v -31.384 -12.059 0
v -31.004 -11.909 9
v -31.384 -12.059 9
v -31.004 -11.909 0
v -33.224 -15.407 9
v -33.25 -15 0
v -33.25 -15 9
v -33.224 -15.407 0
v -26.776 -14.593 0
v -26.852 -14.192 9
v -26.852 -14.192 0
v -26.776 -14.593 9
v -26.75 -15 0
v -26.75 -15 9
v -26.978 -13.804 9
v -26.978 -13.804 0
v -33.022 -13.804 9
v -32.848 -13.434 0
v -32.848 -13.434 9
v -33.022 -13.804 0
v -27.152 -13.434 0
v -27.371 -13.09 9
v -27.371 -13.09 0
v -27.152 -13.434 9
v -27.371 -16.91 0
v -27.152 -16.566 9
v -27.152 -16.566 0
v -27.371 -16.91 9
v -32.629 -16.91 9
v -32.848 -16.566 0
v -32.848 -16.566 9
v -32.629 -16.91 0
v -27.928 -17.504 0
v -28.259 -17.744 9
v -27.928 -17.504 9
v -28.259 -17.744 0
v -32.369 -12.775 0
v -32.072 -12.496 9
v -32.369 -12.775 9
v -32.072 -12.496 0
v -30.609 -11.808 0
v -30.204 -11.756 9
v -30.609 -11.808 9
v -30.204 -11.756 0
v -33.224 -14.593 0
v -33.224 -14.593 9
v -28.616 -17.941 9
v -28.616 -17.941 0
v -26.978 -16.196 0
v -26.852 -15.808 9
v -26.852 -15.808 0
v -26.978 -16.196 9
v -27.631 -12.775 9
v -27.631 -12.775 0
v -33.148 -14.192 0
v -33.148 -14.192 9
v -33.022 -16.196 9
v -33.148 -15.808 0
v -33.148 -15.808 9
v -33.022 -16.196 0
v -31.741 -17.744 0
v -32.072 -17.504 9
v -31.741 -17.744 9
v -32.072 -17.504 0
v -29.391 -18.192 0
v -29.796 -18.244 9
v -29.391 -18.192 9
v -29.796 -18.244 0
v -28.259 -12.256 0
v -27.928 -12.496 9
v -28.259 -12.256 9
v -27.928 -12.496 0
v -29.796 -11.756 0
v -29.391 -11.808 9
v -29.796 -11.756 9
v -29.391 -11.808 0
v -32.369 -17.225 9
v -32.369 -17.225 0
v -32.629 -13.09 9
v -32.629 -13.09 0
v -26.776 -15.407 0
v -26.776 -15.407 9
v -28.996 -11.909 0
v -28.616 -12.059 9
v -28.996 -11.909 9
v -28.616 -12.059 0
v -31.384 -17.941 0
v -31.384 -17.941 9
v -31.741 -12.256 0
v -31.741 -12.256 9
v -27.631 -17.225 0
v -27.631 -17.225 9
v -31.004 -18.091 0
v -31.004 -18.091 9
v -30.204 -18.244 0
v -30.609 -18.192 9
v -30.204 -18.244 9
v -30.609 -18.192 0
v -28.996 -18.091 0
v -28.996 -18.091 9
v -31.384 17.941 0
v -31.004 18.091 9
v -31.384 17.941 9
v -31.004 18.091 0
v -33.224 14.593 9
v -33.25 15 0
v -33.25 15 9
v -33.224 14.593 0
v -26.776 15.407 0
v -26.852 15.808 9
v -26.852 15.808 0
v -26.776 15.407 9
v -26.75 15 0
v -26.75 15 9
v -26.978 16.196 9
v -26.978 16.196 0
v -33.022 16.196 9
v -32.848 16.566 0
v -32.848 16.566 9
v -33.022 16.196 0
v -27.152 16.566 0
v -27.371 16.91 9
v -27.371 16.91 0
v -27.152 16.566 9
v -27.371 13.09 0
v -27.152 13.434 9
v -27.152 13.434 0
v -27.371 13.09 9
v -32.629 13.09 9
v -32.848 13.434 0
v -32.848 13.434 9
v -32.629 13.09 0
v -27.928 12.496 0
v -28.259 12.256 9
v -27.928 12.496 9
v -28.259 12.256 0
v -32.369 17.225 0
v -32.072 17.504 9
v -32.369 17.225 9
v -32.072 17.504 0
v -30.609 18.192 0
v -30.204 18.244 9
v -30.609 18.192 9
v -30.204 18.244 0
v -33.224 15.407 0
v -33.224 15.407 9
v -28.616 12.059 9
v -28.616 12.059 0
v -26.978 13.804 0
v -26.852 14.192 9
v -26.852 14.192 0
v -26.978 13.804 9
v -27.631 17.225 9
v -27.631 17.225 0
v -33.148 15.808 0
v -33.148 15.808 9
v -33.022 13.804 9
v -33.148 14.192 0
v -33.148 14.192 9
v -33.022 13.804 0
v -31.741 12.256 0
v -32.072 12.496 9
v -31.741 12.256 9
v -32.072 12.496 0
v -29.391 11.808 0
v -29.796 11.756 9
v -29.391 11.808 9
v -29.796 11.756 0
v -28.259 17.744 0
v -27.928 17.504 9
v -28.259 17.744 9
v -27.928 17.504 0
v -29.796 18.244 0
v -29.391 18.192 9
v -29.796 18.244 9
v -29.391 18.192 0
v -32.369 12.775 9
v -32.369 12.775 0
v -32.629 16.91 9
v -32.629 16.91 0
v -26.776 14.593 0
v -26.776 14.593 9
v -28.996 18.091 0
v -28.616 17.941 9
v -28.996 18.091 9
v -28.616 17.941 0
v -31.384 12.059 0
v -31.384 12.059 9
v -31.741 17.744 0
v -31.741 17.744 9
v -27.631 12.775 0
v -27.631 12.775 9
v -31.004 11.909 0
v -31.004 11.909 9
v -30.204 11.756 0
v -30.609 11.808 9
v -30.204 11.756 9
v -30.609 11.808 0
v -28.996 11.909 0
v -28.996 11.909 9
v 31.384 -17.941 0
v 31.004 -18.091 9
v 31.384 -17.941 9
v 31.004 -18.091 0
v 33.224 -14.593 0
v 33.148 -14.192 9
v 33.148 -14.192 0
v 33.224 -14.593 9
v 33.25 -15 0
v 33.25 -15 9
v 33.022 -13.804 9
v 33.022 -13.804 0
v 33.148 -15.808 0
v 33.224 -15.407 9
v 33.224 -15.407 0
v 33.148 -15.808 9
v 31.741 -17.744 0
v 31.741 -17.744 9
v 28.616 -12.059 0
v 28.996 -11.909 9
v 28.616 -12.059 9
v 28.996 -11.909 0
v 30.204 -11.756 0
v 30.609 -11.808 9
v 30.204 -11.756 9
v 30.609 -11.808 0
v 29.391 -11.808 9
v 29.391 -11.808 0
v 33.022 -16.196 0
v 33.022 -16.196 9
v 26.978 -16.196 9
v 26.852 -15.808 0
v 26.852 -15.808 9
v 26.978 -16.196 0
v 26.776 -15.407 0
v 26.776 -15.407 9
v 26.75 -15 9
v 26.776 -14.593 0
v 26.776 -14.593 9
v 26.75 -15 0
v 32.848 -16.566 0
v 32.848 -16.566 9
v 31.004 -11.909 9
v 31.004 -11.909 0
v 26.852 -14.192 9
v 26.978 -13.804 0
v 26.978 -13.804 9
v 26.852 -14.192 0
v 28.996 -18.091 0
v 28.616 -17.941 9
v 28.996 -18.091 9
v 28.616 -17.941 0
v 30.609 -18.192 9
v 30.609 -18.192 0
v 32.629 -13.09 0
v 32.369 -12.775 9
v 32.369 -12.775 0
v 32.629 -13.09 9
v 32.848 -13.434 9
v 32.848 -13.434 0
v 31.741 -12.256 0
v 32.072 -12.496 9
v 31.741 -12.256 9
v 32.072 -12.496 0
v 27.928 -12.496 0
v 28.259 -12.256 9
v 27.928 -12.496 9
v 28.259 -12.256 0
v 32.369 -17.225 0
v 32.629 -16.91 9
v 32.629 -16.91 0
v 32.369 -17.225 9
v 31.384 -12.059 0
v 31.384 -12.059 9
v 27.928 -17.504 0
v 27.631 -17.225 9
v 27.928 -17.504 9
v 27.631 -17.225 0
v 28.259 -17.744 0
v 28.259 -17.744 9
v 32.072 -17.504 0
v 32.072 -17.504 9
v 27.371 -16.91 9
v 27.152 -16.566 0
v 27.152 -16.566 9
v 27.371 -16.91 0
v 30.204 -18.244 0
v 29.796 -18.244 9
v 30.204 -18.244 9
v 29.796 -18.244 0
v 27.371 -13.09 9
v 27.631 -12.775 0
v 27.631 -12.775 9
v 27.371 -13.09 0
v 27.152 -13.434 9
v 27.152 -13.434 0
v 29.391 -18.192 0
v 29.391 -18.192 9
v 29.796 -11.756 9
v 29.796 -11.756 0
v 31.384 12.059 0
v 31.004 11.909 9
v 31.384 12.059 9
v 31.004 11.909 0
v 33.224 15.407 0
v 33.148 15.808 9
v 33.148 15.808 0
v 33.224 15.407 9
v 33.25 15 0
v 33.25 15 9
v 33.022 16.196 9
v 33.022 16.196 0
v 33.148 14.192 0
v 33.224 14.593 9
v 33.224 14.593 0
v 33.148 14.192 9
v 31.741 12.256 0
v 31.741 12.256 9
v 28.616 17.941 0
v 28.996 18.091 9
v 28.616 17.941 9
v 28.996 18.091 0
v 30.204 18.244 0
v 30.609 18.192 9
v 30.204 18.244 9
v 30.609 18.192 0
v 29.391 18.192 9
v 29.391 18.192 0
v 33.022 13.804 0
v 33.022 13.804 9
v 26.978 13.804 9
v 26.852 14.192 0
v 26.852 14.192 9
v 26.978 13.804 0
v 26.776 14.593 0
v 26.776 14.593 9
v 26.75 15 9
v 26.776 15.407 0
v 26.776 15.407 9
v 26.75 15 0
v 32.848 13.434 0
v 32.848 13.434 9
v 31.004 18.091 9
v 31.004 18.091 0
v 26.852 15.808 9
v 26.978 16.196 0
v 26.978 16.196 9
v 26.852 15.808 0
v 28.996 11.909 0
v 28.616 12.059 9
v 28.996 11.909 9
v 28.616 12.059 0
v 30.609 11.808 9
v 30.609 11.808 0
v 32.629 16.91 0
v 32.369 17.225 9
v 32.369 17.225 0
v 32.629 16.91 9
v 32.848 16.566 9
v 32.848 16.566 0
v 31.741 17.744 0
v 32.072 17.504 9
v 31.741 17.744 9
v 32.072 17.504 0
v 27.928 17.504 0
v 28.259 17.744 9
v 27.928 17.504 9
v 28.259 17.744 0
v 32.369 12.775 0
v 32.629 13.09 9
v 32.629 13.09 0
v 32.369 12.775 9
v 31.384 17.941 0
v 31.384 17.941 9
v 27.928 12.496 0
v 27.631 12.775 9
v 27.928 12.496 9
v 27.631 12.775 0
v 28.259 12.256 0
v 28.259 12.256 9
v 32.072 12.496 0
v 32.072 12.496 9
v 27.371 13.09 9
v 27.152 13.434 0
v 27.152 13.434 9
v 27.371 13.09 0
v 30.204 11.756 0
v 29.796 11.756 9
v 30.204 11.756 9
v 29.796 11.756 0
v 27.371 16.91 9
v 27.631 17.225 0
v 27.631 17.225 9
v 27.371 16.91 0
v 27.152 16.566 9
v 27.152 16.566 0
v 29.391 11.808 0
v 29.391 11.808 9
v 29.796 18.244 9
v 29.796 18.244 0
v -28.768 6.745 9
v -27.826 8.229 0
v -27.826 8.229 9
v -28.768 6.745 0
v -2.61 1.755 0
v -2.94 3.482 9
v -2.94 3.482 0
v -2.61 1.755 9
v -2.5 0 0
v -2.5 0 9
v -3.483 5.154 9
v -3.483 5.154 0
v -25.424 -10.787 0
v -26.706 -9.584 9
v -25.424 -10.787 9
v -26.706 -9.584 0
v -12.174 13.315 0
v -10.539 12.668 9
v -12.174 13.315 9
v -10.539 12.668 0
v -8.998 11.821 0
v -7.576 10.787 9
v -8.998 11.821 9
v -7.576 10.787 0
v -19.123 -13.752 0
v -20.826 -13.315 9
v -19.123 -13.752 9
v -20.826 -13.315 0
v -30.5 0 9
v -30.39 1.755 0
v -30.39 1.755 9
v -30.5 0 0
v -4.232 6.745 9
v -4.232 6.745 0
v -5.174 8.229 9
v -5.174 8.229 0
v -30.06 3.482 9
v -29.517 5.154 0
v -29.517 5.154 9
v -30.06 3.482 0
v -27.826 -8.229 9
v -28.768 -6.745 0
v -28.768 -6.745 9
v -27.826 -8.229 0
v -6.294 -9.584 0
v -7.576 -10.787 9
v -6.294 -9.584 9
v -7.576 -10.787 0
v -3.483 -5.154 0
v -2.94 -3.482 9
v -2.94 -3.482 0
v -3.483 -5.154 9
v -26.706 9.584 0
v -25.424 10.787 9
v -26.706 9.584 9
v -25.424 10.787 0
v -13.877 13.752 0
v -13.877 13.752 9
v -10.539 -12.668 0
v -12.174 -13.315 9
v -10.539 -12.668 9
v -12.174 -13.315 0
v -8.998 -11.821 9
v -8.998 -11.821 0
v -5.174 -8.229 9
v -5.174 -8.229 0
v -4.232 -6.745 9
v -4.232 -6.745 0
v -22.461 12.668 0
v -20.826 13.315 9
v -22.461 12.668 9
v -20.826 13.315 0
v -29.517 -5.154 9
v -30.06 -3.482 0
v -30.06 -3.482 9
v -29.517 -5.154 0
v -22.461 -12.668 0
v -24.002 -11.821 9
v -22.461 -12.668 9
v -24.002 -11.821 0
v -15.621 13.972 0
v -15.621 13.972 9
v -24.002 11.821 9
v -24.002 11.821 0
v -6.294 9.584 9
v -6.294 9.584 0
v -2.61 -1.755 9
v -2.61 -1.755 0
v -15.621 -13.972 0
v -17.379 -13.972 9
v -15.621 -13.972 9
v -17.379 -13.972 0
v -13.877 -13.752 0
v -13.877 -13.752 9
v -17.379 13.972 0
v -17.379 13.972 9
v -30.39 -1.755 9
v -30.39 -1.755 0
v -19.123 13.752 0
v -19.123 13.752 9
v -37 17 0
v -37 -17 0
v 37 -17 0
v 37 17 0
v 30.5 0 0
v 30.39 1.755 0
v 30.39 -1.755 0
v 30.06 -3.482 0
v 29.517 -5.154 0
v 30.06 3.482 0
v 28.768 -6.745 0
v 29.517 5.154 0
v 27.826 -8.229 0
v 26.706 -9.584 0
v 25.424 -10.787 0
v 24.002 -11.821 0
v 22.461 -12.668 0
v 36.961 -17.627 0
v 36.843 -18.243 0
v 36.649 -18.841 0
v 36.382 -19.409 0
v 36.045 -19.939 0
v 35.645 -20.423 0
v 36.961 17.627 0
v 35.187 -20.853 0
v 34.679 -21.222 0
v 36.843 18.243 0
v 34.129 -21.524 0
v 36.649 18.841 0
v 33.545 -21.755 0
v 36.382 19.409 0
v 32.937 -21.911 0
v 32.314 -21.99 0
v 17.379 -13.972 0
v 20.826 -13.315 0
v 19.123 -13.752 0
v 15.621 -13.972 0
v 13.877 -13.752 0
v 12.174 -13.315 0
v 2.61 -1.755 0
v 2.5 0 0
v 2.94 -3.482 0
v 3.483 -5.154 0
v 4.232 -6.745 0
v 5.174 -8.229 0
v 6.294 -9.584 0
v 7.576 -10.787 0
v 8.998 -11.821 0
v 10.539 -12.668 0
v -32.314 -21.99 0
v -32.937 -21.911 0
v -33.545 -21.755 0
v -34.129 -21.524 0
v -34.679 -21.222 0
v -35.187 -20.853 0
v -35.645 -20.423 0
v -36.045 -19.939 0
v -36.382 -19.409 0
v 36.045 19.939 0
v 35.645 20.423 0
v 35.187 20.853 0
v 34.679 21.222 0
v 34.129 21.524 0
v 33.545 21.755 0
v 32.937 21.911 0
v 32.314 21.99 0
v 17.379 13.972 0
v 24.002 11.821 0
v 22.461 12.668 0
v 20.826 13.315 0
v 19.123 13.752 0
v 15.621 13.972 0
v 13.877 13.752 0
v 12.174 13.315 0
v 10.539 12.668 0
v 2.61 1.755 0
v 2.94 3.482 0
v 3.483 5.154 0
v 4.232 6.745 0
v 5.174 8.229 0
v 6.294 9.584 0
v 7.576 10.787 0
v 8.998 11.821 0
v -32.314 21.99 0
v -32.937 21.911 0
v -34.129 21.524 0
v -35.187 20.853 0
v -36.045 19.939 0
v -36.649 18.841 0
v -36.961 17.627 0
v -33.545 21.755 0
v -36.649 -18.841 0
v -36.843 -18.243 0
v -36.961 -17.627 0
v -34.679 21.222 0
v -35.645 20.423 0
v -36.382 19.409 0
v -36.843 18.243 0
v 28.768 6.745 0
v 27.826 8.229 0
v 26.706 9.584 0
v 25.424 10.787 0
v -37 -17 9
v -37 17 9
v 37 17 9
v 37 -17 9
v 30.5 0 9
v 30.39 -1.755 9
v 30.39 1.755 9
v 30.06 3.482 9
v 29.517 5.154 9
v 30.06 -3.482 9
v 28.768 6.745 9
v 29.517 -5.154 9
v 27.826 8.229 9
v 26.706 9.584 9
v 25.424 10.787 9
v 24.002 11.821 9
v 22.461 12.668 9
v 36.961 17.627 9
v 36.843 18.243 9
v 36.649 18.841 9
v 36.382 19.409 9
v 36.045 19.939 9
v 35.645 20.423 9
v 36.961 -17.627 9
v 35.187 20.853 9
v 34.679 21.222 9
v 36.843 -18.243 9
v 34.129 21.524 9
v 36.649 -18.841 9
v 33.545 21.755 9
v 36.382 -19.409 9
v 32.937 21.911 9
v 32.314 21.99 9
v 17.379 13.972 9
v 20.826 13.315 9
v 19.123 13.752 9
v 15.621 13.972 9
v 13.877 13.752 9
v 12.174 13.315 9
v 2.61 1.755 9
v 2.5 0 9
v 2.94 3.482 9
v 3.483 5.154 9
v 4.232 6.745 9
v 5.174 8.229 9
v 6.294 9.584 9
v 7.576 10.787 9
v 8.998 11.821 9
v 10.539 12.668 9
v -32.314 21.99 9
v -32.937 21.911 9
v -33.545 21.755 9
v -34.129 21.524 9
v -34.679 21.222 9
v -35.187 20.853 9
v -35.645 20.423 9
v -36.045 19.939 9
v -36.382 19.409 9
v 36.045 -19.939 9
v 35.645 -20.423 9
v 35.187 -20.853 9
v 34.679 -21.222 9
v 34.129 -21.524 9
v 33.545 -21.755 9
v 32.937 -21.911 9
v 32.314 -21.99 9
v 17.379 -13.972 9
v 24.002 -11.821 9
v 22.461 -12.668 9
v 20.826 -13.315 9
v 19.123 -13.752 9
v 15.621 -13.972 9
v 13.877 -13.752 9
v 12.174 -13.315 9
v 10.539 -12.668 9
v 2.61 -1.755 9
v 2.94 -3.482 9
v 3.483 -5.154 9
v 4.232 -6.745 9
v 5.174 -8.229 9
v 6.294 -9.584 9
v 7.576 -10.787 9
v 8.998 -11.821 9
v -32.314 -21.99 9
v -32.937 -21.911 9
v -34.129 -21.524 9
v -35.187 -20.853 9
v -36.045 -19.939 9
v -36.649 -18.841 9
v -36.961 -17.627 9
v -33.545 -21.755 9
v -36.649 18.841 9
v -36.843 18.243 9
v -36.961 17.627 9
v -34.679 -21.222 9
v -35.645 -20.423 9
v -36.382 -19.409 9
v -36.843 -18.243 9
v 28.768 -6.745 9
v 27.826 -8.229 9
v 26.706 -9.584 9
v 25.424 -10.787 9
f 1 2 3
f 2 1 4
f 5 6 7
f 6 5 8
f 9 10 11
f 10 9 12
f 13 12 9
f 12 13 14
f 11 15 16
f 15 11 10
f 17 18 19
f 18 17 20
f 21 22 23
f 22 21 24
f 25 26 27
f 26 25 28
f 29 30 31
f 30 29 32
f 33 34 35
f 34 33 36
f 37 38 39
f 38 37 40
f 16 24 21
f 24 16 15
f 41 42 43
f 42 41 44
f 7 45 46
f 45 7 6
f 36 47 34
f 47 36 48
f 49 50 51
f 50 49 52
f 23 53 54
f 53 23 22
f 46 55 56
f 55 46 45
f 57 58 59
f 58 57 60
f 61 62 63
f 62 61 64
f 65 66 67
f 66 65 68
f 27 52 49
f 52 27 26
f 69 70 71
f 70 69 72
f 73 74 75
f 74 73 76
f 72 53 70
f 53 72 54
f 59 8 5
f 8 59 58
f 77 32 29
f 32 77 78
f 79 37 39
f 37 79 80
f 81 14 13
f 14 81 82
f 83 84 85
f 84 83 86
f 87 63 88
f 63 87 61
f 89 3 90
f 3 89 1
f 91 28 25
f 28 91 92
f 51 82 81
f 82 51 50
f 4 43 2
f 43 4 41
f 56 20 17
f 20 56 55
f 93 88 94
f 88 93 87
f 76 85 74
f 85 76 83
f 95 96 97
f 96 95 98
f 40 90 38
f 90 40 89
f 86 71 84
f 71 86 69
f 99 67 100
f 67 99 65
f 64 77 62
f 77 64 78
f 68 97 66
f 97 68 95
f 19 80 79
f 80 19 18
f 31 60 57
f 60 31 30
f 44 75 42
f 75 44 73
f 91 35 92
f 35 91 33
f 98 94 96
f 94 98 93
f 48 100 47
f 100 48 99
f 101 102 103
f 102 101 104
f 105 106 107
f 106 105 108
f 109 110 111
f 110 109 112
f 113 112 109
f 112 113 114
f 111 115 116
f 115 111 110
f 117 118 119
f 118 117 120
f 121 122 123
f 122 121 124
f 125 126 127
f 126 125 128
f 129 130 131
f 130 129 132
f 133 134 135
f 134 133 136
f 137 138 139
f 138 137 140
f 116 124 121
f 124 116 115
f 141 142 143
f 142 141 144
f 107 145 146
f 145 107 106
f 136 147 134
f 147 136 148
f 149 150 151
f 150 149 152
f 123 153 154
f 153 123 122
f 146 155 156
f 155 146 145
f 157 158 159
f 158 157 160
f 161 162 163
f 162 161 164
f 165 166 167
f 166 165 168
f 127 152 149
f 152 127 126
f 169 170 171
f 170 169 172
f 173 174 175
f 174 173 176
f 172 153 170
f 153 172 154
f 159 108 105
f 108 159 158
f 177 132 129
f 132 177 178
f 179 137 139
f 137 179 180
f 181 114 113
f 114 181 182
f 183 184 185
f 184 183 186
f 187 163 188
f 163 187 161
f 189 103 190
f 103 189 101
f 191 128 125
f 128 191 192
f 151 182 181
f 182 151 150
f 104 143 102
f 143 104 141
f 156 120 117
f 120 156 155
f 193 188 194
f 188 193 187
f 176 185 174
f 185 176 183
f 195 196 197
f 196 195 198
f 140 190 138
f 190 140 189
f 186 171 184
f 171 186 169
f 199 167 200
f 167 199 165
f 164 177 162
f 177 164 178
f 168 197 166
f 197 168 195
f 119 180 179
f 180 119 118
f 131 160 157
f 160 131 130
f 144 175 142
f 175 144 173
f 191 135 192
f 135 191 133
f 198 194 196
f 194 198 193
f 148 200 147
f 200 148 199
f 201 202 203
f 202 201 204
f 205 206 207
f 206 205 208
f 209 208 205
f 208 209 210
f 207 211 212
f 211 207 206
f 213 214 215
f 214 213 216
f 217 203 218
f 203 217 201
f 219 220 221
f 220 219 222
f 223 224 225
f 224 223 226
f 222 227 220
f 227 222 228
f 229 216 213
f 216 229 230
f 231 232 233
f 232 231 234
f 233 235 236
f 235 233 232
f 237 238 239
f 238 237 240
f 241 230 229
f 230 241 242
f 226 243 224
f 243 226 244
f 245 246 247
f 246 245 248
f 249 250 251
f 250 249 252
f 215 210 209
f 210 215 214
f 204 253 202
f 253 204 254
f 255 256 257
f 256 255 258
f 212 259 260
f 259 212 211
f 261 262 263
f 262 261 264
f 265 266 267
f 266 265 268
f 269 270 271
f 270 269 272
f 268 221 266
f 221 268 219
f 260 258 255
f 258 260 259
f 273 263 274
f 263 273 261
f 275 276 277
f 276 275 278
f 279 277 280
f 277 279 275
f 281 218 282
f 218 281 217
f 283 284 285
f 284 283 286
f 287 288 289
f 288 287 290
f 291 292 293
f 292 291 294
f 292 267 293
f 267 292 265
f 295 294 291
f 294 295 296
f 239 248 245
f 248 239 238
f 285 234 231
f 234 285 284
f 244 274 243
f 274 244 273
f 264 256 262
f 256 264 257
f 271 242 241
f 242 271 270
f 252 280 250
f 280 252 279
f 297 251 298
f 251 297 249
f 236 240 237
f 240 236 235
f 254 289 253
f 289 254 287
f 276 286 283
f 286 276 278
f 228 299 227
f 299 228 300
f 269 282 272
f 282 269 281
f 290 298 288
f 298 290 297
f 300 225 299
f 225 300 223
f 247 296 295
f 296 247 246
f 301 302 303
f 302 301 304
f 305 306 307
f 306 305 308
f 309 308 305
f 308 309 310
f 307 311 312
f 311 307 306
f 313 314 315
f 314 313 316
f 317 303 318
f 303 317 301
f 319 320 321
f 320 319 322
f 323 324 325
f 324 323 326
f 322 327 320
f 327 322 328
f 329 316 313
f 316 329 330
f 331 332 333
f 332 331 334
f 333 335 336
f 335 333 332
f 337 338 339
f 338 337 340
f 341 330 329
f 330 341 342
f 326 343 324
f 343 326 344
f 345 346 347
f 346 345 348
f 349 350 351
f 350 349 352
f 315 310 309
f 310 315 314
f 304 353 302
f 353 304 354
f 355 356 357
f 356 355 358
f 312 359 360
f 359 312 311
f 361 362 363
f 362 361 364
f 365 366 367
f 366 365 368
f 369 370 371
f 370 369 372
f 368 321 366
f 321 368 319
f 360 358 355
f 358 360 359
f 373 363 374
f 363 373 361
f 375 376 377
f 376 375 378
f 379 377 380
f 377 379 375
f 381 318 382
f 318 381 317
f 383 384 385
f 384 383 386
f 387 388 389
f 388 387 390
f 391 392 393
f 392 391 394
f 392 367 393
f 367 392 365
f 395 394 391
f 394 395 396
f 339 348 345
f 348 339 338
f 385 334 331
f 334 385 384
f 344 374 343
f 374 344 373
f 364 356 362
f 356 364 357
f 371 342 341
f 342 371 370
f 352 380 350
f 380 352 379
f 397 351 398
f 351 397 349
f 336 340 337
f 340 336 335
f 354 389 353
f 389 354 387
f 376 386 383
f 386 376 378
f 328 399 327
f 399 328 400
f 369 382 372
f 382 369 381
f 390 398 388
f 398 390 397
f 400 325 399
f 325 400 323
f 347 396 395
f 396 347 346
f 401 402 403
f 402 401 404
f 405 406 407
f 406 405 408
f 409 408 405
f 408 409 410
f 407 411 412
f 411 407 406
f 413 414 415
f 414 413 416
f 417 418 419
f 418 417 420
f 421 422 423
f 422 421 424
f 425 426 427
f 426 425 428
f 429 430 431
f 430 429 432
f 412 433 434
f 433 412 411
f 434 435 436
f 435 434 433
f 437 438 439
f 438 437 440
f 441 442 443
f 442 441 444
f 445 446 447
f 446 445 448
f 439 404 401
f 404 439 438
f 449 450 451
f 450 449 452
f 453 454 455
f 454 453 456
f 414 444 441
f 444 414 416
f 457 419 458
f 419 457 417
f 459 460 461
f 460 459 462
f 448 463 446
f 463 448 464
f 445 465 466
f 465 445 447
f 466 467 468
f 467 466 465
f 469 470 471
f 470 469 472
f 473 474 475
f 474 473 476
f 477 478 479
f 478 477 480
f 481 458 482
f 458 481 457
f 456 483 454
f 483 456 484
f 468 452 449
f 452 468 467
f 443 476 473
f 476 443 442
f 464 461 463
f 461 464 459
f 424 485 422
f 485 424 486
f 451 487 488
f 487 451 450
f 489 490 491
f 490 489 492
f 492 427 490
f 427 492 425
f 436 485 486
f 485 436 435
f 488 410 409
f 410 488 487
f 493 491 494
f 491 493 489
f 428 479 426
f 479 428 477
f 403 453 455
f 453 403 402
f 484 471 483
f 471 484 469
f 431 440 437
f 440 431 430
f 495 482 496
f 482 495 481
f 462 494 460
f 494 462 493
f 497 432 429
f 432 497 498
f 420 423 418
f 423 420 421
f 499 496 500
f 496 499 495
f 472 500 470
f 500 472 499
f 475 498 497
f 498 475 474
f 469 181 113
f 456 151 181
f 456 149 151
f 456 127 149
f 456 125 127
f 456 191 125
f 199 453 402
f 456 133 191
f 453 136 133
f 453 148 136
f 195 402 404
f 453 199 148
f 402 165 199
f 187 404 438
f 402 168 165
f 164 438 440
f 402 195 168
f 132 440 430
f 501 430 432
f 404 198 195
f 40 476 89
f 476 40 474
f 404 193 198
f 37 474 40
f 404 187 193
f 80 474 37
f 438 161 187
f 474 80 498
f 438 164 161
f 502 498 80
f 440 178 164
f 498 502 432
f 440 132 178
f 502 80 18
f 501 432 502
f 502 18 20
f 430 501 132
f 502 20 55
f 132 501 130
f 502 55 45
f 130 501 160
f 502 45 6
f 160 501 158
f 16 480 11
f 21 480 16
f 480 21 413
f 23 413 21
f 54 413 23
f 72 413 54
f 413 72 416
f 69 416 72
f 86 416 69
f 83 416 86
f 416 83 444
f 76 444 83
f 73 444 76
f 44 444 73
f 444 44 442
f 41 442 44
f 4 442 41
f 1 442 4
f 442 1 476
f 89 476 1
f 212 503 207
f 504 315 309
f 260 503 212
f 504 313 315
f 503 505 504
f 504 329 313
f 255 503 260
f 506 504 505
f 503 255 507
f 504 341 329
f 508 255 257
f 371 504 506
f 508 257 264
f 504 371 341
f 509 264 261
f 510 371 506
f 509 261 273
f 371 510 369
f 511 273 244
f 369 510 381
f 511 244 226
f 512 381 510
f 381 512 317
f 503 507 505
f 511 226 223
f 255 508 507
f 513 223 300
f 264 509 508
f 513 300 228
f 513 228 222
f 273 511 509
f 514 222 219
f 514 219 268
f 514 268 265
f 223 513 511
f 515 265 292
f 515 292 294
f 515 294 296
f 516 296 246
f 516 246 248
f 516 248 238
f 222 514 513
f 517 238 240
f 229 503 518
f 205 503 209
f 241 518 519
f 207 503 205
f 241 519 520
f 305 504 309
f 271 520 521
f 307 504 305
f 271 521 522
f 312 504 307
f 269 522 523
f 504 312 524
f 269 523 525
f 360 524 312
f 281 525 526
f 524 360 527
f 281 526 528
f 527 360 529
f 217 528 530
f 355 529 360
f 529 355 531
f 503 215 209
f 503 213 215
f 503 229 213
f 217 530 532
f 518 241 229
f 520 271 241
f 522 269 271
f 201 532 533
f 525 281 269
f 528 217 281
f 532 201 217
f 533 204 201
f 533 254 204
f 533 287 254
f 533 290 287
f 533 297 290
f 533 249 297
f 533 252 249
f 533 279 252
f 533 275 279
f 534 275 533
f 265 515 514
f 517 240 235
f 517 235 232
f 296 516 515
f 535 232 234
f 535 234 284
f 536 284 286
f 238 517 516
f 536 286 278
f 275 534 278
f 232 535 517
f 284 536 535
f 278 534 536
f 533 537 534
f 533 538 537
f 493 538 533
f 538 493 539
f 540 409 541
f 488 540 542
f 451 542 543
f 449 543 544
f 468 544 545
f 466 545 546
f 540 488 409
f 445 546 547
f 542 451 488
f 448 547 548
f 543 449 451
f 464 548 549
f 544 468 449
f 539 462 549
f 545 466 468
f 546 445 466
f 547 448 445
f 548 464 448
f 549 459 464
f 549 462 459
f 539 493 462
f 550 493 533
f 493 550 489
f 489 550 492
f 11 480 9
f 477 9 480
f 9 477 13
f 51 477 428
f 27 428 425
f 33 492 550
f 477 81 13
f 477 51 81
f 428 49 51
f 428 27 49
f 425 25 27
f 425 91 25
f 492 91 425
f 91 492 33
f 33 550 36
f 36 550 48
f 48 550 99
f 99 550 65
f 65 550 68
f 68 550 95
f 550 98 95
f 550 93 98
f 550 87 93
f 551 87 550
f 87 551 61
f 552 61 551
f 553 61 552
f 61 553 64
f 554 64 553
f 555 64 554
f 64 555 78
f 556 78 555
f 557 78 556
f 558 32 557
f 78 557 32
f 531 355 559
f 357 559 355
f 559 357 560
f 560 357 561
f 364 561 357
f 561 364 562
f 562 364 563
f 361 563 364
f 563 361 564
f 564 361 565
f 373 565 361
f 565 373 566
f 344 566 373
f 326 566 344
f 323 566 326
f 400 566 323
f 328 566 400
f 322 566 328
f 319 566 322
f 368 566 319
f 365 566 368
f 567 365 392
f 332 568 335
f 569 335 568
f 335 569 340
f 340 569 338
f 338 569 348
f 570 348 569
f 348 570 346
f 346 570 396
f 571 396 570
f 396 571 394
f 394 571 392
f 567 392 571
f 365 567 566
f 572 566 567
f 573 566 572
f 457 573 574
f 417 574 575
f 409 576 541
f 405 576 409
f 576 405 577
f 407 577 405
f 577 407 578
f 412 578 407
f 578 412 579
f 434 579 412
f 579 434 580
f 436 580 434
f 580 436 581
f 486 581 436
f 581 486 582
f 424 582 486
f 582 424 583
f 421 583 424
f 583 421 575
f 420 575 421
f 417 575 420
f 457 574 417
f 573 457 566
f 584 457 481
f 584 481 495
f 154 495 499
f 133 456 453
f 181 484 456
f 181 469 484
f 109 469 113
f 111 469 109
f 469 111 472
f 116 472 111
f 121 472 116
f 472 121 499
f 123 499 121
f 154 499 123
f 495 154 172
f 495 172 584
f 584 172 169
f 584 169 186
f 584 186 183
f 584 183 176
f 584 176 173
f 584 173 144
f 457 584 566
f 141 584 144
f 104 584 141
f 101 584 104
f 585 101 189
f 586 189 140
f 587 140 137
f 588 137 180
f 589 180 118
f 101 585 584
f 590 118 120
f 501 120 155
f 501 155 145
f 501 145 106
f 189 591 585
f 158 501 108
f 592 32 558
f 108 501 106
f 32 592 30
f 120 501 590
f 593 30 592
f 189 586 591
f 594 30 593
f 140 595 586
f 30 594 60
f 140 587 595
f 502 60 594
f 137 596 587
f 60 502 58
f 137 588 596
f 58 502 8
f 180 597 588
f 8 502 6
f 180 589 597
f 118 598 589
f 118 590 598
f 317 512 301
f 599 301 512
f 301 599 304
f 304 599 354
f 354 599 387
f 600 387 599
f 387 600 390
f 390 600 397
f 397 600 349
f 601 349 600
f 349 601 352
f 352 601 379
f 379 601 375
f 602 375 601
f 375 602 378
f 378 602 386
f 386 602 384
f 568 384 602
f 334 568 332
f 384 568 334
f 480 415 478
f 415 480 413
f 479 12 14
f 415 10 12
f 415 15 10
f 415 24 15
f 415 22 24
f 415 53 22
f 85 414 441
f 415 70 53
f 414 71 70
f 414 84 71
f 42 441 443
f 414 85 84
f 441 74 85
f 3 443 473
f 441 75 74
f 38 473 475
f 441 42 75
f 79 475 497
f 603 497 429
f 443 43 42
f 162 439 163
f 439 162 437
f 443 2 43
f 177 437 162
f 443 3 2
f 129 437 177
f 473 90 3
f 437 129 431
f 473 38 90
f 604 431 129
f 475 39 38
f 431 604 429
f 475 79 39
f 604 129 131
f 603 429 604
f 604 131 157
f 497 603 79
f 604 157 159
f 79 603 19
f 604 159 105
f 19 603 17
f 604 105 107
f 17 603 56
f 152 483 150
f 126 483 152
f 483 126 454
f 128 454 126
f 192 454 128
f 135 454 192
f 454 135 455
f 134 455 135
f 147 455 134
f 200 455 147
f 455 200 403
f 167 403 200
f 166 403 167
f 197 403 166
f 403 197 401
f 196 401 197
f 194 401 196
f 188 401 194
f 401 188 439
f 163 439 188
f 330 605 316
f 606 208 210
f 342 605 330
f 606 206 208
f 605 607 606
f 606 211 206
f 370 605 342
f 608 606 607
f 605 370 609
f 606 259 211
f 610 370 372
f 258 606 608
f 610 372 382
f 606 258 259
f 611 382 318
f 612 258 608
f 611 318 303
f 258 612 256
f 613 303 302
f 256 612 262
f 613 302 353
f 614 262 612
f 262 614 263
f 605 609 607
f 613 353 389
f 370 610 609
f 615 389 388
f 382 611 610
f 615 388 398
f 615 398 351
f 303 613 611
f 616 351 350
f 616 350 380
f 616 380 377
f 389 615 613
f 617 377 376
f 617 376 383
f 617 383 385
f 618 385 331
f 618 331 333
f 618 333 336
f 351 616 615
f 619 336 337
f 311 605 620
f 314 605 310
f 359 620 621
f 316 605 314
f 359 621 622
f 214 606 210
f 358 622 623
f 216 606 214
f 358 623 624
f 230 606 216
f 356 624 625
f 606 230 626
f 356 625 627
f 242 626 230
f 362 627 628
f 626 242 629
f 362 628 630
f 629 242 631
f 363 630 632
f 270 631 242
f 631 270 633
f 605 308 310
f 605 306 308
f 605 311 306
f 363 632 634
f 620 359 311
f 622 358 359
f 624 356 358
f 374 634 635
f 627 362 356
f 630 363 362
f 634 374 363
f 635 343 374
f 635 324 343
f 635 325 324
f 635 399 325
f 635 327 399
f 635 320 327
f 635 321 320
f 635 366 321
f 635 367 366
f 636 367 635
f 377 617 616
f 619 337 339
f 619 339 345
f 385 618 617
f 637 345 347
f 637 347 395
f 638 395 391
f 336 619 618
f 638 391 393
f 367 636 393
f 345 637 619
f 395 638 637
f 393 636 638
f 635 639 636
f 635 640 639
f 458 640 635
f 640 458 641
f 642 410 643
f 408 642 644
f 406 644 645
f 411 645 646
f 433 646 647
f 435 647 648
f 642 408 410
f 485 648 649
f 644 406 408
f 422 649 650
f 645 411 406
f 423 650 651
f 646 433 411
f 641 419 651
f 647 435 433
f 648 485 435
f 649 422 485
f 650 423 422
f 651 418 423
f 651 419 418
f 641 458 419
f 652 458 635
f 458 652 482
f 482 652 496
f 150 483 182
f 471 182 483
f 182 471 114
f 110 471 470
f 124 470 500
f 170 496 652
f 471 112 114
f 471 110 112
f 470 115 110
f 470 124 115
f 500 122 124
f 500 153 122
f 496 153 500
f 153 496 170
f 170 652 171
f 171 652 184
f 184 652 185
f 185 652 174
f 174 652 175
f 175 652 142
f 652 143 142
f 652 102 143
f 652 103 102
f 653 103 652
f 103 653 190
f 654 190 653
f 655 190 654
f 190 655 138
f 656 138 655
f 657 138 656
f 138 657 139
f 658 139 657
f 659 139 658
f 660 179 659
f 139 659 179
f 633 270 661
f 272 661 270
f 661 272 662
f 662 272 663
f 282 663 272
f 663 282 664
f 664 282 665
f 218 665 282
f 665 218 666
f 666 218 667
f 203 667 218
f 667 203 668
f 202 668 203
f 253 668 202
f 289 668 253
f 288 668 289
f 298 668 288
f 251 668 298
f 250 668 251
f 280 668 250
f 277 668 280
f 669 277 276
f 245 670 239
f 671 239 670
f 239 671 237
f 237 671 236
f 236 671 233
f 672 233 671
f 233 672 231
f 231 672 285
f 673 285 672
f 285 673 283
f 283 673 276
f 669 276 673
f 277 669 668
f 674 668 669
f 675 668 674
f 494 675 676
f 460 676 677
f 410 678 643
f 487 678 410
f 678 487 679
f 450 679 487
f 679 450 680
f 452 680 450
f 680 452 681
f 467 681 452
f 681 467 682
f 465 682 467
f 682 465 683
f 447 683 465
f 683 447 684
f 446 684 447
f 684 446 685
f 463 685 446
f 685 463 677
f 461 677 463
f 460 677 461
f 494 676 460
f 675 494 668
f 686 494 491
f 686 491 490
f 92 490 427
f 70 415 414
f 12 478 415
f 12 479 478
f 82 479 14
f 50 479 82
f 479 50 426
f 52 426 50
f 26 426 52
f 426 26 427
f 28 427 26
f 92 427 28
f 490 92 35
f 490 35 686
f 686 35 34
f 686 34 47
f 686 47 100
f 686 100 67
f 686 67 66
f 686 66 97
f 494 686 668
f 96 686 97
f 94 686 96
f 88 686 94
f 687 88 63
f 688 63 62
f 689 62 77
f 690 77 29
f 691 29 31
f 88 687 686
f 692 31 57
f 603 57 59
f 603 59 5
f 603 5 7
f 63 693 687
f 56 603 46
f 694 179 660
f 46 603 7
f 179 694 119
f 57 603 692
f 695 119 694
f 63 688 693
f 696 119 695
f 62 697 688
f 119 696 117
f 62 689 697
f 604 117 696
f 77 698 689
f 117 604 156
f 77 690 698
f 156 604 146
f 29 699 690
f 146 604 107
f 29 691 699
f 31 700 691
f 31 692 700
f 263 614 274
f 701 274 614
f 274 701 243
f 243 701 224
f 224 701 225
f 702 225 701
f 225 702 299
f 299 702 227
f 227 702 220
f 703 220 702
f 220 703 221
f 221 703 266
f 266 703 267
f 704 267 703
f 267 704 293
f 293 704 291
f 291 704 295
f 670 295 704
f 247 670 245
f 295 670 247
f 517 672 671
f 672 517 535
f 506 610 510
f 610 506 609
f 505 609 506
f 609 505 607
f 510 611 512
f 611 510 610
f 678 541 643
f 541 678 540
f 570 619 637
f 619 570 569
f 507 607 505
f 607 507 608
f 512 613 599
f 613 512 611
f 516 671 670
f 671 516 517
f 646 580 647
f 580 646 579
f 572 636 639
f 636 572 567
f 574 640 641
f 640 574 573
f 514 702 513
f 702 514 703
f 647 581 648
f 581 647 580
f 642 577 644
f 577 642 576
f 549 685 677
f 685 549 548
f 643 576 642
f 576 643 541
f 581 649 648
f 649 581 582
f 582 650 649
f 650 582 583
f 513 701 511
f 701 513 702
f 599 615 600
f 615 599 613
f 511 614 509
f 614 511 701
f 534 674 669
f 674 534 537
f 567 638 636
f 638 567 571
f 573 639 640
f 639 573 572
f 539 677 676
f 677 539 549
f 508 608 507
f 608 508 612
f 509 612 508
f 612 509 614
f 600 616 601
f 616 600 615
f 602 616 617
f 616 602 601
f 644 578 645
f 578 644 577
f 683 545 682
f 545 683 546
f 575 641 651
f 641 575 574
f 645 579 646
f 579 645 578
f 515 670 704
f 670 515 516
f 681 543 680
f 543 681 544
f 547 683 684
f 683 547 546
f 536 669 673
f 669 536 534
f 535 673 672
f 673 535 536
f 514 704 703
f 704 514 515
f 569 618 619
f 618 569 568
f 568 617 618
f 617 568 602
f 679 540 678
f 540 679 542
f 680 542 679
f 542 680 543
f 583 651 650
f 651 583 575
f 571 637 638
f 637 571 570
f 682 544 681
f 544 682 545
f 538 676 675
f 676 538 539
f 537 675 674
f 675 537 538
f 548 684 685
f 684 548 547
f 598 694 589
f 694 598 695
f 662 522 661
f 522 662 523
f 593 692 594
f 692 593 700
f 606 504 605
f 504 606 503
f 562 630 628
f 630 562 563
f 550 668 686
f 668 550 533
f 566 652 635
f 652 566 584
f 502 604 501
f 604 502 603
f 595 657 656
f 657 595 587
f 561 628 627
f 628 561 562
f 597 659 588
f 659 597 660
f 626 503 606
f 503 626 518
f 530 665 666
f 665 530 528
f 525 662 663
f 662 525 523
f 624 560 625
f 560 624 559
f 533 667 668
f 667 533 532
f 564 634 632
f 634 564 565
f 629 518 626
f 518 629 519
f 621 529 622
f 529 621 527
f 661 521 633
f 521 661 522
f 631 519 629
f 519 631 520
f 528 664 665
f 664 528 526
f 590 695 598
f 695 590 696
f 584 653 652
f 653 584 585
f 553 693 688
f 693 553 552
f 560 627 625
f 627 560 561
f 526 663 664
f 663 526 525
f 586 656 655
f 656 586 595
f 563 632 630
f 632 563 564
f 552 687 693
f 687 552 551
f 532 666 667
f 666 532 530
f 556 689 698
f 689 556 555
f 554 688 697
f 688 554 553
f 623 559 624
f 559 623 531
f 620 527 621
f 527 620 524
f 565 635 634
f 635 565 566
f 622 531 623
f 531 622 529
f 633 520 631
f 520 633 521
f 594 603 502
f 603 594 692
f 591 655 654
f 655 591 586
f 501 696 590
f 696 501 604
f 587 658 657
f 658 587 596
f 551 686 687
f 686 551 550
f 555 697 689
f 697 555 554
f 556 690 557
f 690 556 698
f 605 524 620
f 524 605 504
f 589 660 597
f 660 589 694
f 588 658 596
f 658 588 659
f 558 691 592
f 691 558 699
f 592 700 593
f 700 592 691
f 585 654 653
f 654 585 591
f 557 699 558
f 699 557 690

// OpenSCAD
$fn = 50;

difference() {
	union() {
		hull() {
			translate(v = [-32.0, 17.0, 0]) {
				cylinder(h = 9, r = 5);
			}
			translate(v = [32.0, 17.0, 0]) {
				cylinder(h = 9, r = 5);
			}
			translate(v = [-32.0, -17.0, 0]) {
				cylinder(h = 9, r = 5);
			}
			translate(v = [32.0, -17.0, 0]) {
				cylinder(h = 9, r = 5);
			}
		}
	}
	union() {
		translate(v = [-30.0, -15.0, -100.0]) {
			cylinder(h = 200, r = 3.25);
		}
		translate(v = [-30.0, 15.0, -100.0]) {
			cylinder(h = 200, r = 3.25);
		}
		translate(v = [30.0, -15.0, -100.0]) {
			cylinder(h = 200, r = 3.25);
		}
		translate(v = [30.0, 15.0, -100.0]) {
			cylinder(h = 200, r = 3.25);
		}
		translate(v = [-30.0, -15.0, -100.0]) {
			cylinder(h = 200, r = 1.8);
		}
		translate(v = [-30.0, 15.0, -100.0]) {
			cylinder(h = 200, r = 1.8);
		}
		translate(v = [30.0, -15.0, -100.0]) {
			cylinder(h = 200, r = 1.8);
		}
		translate(v = [30.0, 15.0, -100.0]) {
			cylinder(h = 200, r = 1.8);
		}
		translate(v = [-16.5, 0, 0.0]) {
			cylinder(h = 9, r = 14.0);
		}
		translate(v = [16.5, 0, 0.0]) {
			cylinder(h = 9, r = 14.0);
		}
	}
}
